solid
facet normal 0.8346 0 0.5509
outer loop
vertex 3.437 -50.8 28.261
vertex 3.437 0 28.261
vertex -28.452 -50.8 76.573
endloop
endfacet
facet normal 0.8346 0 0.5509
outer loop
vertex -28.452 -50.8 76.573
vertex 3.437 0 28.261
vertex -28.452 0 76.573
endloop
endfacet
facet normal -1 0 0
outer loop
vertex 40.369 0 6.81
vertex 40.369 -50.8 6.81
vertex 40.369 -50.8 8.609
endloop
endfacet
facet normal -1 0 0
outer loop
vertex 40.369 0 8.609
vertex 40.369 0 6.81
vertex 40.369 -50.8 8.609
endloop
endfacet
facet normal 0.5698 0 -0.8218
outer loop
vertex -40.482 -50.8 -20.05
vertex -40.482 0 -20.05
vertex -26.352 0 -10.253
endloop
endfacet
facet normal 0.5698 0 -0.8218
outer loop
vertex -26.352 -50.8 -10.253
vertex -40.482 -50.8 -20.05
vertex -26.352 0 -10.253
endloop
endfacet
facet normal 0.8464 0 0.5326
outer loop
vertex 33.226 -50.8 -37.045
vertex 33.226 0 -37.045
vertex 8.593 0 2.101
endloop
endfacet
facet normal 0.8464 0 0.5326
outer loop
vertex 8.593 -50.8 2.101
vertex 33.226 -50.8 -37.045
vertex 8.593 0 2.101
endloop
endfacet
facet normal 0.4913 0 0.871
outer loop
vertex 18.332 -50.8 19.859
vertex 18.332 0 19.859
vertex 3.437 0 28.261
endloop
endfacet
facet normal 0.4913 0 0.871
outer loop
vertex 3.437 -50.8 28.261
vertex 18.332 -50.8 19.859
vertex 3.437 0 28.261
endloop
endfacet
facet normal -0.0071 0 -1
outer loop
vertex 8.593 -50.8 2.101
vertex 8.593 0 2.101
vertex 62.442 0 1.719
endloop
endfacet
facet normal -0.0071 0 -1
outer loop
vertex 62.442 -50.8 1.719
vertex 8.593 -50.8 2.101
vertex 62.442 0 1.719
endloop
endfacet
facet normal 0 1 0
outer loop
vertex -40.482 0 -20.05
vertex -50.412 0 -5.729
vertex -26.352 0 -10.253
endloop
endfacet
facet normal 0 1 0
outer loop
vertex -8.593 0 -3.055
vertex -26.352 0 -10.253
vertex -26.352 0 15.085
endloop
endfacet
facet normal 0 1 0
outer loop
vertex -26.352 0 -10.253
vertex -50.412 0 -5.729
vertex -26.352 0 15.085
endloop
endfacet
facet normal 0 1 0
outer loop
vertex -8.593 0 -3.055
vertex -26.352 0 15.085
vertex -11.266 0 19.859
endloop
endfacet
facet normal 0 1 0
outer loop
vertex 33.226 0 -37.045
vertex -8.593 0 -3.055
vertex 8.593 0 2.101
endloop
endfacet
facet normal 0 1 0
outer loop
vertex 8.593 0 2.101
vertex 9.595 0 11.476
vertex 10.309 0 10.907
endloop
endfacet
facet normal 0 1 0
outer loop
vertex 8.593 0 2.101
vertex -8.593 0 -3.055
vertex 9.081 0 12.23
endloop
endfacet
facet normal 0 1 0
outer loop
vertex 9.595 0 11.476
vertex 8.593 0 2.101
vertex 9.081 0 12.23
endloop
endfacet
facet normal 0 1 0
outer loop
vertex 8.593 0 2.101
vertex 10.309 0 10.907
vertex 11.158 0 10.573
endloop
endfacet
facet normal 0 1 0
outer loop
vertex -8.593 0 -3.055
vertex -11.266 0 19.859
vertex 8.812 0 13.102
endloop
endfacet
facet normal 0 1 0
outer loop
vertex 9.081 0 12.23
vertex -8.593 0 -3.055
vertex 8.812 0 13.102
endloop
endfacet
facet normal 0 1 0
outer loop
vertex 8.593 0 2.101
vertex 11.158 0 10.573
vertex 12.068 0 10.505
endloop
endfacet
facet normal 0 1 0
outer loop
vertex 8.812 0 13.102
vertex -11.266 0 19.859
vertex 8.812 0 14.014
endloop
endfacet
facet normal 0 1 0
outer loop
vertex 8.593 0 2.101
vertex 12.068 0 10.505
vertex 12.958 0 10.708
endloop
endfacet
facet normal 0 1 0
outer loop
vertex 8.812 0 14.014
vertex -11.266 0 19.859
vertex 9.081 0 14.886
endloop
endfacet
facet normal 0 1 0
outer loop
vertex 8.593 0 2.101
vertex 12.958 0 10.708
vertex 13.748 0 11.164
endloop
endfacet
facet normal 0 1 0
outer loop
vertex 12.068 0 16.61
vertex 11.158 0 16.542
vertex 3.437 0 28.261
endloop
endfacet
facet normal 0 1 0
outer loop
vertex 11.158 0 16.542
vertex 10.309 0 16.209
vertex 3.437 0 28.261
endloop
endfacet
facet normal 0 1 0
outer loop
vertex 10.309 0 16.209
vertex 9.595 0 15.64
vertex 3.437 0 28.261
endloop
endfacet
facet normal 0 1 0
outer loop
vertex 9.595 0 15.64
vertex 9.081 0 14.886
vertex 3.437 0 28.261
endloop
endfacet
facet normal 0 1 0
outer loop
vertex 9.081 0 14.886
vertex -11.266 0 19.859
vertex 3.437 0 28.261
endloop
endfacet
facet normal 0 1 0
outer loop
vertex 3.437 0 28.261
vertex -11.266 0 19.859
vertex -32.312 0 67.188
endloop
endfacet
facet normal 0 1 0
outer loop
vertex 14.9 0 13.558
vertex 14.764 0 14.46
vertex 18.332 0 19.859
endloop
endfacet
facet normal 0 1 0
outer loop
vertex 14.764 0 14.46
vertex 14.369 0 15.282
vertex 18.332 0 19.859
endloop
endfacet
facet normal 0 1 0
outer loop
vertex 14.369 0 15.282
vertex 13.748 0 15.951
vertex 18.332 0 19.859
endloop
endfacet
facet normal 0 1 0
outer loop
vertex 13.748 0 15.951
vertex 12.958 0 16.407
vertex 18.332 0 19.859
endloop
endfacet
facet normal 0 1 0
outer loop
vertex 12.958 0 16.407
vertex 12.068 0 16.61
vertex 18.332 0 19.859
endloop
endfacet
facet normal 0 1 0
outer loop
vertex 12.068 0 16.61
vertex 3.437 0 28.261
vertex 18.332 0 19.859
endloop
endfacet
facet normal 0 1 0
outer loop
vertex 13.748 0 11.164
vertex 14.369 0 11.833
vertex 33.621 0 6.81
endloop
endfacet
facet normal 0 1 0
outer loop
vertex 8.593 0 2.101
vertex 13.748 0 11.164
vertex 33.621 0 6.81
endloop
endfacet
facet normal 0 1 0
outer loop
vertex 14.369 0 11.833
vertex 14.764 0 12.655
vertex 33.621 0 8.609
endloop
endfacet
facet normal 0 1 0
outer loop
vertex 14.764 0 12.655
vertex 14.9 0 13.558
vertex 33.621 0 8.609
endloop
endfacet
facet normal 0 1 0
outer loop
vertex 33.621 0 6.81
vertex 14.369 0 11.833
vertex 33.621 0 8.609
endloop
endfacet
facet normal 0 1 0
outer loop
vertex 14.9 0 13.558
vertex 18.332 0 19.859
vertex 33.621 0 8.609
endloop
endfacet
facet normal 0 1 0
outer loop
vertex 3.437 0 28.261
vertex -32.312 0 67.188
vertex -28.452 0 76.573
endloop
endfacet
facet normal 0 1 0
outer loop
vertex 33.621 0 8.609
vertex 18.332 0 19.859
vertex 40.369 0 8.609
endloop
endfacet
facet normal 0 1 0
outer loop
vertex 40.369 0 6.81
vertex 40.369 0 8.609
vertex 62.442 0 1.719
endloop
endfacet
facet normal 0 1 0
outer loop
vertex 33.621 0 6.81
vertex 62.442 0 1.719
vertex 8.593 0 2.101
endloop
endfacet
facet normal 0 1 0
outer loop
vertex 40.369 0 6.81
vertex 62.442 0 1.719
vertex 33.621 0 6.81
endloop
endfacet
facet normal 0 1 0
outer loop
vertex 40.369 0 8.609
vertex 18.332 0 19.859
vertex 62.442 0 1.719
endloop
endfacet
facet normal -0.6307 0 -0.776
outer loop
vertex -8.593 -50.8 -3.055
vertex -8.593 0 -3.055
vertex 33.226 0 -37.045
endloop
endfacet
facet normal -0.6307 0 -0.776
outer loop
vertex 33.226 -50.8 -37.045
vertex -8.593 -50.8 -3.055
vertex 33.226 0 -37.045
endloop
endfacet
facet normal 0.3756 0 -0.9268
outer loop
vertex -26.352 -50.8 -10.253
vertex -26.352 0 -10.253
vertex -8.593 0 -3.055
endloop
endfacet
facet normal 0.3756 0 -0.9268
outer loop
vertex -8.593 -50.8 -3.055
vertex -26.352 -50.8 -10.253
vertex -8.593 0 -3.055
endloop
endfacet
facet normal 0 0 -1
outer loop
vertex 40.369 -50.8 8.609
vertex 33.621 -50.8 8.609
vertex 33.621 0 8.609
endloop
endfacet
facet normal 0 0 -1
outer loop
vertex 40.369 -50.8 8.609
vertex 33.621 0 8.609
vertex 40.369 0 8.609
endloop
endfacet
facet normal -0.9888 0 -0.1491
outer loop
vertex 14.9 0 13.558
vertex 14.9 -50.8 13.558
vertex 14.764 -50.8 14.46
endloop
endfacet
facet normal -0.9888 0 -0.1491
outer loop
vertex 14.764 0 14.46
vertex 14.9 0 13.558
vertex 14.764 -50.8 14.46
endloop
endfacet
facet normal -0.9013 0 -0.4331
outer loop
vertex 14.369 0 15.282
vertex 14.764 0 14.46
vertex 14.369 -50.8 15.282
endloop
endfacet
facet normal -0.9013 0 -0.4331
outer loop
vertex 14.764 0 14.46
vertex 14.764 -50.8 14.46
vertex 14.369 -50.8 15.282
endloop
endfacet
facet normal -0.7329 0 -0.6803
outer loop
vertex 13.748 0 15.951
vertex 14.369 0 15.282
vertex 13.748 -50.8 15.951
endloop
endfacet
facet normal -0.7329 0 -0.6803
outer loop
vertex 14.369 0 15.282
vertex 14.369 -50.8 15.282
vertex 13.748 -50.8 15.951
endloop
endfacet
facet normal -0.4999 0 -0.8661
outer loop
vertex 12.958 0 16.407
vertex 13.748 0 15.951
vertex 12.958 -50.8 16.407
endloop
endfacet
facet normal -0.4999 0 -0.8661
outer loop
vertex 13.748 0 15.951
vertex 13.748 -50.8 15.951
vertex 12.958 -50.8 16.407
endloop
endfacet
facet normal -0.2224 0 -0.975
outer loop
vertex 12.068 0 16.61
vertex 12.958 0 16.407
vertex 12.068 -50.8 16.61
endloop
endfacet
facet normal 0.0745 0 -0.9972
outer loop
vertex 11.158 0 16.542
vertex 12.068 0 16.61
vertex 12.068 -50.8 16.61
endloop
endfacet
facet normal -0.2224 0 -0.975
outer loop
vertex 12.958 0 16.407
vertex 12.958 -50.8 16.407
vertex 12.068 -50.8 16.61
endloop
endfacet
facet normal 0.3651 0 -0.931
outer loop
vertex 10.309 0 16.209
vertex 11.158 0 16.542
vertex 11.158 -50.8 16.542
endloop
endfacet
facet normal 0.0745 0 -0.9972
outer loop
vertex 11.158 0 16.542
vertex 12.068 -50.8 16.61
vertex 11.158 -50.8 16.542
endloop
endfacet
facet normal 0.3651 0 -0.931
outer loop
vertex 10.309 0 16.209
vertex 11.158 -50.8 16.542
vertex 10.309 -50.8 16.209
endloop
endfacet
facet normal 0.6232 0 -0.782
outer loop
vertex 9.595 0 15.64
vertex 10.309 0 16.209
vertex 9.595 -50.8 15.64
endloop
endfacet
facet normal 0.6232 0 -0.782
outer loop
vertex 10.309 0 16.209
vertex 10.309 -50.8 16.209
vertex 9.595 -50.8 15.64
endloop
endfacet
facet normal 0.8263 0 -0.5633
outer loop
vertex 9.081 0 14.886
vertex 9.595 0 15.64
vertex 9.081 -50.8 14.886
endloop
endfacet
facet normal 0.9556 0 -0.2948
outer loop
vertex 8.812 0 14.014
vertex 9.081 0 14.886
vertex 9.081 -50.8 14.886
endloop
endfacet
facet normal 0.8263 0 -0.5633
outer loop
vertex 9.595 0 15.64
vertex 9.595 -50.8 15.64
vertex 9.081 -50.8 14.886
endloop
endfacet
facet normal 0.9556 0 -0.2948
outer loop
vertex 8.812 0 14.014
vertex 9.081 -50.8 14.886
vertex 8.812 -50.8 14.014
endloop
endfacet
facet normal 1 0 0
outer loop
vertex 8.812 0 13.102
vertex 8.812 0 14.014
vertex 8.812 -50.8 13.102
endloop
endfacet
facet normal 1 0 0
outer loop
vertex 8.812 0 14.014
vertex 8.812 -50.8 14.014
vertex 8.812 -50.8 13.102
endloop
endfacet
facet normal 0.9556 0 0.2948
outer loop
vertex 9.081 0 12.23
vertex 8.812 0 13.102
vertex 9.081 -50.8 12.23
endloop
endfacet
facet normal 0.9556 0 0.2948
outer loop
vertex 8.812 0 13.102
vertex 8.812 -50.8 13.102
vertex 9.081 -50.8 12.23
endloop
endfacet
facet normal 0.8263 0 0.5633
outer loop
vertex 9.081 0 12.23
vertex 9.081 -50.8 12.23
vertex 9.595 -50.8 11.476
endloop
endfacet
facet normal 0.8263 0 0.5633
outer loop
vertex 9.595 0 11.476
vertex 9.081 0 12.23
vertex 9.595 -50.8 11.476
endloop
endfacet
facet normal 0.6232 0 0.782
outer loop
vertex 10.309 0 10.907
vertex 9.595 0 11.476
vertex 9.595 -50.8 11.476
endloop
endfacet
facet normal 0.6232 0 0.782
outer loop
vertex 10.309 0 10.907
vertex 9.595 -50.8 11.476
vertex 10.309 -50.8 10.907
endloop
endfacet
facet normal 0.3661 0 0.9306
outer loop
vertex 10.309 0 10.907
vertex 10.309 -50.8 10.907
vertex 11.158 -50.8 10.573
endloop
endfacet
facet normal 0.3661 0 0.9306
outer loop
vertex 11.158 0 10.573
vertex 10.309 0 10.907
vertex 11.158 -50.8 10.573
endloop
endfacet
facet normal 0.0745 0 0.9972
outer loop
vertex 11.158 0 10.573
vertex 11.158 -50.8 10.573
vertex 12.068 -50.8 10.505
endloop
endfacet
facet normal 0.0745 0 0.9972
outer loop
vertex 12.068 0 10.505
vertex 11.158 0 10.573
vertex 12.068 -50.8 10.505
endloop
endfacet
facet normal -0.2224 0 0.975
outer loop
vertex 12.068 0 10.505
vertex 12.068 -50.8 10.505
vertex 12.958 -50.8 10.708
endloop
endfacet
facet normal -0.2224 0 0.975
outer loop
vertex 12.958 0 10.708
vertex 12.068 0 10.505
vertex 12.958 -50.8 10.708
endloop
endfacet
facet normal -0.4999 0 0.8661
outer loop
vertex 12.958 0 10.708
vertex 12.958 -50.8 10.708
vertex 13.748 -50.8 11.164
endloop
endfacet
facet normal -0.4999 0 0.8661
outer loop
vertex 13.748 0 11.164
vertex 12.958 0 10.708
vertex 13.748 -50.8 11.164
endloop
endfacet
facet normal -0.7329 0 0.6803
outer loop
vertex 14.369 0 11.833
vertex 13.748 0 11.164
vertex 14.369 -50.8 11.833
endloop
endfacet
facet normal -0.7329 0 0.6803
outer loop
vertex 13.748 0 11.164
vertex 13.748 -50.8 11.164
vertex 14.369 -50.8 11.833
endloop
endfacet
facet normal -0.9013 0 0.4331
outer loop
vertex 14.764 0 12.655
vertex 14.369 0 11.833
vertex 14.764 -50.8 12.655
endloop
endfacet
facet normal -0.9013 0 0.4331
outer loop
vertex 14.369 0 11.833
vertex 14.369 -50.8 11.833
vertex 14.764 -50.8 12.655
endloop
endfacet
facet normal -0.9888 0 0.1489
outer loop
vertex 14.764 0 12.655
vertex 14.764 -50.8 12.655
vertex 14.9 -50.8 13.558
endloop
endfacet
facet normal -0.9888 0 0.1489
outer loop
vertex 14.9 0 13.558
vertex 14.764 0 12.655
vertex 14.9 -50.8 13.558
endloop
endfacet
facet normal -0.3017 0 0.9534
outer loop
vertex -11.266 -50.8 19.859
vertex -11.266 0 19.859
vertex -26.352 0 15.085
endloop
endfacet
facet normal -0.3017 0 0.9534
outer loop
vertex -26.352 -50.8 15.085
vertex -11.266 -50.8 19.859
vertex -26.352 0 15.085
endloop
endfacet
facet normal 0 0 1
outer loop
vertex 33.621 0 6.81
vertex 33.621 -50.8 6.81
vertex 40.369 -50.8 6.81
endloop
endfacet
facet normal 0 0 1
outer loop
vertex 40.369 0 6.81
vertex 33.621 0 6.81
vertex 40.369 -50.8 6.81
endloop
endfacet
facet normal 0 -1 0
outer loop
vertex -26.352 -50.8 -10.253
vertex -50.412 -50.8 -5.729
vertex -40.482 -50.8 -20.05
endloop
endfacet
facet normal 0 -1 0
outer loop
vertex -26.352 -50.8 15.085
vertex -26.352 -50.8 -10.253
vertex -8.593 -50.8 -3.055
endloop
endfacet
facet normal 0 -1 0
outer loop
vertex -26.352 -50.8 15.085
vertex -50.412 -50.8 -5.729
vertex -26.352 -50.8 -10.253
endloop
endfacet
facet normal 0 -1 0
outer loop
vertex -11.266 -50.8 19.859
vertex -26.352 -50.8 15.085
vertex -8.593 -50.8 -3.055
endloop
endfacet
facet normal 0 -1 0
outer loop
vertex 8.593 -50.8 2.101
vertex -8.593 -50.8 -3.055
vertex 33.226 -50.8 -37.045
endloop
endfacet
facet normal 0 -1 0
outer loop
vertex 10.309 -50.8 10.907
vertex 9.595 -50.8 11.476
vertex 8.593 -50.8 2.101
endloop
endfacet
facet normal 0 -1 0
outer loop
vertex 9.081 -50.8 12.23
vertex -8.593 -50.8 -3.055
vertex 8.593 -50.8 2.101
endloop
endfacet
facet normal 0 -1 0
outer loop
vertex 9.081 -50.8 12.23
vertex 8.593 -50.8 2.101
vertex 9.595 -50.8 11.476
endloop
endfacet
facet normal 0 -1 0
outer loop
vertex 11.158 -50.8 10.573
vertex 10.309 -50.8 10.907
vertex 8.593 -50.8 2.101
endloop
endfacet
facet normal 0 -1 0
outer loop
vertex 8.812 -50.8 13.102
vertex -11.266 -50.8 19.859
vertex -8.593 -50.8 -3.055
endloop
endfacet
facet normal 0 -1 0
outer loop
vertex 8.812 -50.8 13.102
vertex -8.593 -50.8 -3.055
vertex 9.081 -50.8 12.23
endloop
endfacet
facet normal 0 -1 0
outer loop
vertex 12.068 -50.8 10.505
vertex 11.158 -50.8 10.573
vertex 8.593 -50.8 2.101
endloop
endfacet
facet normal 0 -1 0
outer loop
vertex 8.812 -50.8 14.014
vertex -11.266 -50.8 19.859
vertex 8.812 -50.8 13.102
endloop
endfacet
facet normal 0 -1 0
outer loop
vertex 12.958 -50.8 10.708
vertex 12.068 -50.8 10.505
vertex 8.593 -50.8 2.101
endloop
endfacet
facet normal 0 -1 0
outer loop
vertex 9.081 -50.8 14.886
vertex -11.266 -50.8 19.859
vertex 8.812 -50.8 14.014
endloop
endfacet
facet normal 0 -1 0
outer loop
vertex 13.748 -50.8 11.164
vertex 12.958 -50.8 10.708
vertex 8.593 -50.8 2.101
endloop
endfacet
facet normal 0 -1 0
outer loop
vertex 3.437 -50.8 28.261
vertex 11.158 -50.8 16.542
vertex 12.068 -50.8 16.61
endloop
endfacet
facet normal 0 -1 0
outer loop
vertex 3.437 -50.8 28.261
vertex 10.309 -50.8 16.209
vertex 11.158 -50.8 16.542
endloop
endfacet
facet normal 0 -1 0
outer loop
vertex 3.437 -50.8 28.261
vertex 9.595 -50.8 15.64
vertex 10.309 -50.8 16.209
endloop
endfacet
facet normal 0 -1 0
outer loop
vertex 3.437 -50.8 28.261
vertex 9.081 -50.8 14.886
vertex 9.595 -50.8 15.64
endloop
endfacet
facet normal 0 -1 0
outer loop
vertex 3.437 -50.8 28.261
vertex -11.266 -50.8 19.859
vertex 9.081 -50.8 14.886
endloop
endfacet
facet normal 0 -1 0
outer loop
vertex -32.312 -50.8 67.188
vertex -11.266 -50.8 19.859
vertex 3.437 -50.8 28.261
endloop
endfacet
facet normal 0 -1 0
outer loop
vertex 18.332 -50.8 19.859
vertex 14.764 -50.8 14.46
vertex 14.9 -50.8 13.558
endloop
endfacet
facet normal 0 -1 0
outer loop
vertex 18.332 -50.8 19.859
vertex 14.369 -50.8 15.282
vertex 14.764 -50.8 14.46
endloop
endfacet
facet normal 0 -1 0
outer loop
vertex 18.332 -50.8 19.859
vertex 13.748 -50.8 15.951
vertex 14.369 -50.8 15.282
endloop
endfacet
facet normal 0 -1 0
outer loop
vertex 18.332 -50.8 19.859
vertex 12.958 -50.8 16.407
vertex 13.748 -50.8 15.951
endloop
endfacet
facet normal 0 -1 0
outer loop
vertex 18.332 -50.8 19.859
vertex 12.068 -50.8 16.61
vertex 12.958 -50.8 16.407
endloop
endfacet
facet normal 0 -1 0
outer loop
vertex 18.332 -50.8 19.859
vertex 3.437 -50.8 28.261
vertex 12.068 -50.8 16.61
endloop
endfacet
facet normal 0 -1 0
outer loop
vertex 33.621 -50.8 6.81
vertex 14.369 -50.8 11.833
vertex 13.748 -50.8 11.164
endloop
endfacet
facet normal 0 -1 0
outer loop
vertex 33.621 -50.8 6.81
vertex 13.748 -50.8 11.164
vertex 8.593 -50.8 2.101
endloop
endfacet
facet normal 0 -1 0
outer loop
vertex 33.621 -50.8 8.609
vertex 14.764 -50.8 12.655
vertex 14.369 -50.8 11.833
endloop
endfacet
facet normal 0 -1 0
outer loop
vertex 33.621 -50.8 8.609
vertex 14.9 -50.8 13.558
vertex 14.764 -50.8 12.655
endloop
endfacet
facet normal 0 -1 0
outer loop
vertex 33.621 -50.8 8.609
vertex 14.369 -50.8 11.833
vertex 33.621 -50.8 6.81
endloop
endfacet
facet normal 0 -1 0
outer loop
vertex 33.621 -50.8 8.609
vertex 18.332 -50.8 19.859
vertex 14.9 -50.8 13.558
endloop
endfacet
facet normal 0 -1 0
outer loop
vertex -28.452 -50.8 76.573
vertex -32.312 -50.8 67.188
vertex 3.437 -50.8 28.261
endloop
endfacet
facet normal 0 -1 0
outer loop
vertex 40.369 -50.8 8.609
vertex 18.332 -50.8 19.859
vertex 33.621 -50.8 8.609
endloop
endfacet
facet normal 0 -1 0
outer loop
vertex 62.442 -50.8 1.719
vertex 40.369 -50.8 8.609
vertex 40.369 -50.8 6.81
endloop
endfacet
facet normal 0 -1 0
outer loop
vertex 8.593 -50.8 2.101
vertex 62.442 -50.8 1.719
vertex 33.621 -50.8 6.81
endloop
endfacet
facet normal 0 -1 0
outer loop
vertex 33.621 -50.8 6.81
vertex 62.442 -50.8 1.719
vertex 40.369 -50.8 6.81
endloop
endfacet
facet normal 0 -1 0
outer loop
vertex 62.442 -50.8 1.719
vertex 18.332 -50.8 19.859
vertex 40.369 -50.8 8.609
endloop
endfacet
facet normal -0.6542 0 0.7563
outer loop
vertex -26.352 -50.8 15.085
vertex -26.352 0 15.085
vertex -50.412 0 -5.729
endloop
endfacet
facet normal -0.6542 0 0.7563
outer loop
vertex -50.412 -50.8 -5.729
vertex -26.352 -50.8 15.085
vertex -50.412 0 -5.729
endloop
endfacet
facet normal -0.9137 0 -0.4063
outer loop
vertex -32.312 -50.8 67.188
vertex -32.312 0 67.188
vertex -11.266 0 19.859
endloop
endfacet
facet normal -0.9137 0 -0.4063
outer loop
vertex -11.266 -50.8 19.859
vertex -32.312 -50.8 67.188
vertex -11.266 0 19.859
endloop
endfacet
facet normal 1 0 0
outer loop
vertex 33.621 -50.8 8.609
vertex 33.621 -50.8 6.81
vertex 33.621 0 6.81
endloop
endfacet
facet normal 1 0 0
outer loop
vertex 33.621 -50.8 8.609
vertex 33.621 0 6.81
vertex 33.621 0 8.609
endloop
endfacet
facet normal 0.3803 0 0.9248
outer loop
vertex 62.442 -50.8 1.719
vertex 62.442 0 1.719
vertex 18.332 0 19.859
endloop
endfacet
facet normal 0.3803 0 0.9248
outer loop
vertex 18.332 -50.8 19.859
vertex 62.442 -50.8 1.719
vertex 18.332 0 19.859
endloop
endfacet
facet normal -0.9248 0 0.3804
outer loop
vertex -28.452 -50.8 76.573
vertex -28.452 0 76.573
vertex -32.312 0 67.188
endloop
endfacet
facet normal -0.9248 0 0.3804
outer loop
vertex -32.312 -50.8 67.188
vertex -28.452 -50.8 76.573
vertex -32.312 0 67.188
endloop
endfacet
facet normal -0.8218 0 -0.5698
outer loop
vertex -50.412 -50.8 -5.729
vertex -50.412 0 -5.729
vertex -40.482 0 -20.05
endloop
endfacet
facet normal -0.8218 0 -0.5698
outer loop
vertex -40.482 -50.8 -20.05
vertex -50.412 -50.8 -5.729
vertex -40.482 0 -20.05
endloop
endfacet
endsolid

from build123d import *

# Parameters (mm, degrees)
F1_DEPTH = 50.8
F2_R     = 3.061236
F3_DEPTH = 50.8
F4_W     = 6.747894
F4_H     = 1.79878
F5_DEPTH = 50.8


with BuildPart() as f1:
    # F0 (on Front) → F1 (new body)
    with BuildSketch(Plane.XZ):
        Polygon((8.592959, 2.100501), (62.442172, 1.718592), (18.331647, 19.859284), (3.437185, 28.261289), (-28.452244, 76.572813), (-32.311786, 67.188031), (-11.266325, 19.859284), (-26.351742, 15.085418), (-50.412029, -5.72864), (-40.482387, -20.050241), (-26.351742, -10.252995), (-8.592959, -3.055275), (33.22611, -37.045203), align=None)
    extrude(amount=F1_DEPTH)

    # F2 (on face) → F3 (cut)
    with BuildSketch(Plane.XZ.offset(50.8)):
        with Locations((11.83919, 13.557781)):
            Circle(F2_R)
    extrude(amount=-F3_DEPTH, mode=Mode.SUBTRACT)

    # F4 (on face) → F5 (cut)
    with BuildSketch(Plane.XZ.offset(50.8)):
        with Locations((36.995076, 7.709399)):
            Rectangle(F4_W, F4_H)
    extrude(amount=-F5_DEPTH, mode=Mode.SUBTRACT)


solid = f1.part
